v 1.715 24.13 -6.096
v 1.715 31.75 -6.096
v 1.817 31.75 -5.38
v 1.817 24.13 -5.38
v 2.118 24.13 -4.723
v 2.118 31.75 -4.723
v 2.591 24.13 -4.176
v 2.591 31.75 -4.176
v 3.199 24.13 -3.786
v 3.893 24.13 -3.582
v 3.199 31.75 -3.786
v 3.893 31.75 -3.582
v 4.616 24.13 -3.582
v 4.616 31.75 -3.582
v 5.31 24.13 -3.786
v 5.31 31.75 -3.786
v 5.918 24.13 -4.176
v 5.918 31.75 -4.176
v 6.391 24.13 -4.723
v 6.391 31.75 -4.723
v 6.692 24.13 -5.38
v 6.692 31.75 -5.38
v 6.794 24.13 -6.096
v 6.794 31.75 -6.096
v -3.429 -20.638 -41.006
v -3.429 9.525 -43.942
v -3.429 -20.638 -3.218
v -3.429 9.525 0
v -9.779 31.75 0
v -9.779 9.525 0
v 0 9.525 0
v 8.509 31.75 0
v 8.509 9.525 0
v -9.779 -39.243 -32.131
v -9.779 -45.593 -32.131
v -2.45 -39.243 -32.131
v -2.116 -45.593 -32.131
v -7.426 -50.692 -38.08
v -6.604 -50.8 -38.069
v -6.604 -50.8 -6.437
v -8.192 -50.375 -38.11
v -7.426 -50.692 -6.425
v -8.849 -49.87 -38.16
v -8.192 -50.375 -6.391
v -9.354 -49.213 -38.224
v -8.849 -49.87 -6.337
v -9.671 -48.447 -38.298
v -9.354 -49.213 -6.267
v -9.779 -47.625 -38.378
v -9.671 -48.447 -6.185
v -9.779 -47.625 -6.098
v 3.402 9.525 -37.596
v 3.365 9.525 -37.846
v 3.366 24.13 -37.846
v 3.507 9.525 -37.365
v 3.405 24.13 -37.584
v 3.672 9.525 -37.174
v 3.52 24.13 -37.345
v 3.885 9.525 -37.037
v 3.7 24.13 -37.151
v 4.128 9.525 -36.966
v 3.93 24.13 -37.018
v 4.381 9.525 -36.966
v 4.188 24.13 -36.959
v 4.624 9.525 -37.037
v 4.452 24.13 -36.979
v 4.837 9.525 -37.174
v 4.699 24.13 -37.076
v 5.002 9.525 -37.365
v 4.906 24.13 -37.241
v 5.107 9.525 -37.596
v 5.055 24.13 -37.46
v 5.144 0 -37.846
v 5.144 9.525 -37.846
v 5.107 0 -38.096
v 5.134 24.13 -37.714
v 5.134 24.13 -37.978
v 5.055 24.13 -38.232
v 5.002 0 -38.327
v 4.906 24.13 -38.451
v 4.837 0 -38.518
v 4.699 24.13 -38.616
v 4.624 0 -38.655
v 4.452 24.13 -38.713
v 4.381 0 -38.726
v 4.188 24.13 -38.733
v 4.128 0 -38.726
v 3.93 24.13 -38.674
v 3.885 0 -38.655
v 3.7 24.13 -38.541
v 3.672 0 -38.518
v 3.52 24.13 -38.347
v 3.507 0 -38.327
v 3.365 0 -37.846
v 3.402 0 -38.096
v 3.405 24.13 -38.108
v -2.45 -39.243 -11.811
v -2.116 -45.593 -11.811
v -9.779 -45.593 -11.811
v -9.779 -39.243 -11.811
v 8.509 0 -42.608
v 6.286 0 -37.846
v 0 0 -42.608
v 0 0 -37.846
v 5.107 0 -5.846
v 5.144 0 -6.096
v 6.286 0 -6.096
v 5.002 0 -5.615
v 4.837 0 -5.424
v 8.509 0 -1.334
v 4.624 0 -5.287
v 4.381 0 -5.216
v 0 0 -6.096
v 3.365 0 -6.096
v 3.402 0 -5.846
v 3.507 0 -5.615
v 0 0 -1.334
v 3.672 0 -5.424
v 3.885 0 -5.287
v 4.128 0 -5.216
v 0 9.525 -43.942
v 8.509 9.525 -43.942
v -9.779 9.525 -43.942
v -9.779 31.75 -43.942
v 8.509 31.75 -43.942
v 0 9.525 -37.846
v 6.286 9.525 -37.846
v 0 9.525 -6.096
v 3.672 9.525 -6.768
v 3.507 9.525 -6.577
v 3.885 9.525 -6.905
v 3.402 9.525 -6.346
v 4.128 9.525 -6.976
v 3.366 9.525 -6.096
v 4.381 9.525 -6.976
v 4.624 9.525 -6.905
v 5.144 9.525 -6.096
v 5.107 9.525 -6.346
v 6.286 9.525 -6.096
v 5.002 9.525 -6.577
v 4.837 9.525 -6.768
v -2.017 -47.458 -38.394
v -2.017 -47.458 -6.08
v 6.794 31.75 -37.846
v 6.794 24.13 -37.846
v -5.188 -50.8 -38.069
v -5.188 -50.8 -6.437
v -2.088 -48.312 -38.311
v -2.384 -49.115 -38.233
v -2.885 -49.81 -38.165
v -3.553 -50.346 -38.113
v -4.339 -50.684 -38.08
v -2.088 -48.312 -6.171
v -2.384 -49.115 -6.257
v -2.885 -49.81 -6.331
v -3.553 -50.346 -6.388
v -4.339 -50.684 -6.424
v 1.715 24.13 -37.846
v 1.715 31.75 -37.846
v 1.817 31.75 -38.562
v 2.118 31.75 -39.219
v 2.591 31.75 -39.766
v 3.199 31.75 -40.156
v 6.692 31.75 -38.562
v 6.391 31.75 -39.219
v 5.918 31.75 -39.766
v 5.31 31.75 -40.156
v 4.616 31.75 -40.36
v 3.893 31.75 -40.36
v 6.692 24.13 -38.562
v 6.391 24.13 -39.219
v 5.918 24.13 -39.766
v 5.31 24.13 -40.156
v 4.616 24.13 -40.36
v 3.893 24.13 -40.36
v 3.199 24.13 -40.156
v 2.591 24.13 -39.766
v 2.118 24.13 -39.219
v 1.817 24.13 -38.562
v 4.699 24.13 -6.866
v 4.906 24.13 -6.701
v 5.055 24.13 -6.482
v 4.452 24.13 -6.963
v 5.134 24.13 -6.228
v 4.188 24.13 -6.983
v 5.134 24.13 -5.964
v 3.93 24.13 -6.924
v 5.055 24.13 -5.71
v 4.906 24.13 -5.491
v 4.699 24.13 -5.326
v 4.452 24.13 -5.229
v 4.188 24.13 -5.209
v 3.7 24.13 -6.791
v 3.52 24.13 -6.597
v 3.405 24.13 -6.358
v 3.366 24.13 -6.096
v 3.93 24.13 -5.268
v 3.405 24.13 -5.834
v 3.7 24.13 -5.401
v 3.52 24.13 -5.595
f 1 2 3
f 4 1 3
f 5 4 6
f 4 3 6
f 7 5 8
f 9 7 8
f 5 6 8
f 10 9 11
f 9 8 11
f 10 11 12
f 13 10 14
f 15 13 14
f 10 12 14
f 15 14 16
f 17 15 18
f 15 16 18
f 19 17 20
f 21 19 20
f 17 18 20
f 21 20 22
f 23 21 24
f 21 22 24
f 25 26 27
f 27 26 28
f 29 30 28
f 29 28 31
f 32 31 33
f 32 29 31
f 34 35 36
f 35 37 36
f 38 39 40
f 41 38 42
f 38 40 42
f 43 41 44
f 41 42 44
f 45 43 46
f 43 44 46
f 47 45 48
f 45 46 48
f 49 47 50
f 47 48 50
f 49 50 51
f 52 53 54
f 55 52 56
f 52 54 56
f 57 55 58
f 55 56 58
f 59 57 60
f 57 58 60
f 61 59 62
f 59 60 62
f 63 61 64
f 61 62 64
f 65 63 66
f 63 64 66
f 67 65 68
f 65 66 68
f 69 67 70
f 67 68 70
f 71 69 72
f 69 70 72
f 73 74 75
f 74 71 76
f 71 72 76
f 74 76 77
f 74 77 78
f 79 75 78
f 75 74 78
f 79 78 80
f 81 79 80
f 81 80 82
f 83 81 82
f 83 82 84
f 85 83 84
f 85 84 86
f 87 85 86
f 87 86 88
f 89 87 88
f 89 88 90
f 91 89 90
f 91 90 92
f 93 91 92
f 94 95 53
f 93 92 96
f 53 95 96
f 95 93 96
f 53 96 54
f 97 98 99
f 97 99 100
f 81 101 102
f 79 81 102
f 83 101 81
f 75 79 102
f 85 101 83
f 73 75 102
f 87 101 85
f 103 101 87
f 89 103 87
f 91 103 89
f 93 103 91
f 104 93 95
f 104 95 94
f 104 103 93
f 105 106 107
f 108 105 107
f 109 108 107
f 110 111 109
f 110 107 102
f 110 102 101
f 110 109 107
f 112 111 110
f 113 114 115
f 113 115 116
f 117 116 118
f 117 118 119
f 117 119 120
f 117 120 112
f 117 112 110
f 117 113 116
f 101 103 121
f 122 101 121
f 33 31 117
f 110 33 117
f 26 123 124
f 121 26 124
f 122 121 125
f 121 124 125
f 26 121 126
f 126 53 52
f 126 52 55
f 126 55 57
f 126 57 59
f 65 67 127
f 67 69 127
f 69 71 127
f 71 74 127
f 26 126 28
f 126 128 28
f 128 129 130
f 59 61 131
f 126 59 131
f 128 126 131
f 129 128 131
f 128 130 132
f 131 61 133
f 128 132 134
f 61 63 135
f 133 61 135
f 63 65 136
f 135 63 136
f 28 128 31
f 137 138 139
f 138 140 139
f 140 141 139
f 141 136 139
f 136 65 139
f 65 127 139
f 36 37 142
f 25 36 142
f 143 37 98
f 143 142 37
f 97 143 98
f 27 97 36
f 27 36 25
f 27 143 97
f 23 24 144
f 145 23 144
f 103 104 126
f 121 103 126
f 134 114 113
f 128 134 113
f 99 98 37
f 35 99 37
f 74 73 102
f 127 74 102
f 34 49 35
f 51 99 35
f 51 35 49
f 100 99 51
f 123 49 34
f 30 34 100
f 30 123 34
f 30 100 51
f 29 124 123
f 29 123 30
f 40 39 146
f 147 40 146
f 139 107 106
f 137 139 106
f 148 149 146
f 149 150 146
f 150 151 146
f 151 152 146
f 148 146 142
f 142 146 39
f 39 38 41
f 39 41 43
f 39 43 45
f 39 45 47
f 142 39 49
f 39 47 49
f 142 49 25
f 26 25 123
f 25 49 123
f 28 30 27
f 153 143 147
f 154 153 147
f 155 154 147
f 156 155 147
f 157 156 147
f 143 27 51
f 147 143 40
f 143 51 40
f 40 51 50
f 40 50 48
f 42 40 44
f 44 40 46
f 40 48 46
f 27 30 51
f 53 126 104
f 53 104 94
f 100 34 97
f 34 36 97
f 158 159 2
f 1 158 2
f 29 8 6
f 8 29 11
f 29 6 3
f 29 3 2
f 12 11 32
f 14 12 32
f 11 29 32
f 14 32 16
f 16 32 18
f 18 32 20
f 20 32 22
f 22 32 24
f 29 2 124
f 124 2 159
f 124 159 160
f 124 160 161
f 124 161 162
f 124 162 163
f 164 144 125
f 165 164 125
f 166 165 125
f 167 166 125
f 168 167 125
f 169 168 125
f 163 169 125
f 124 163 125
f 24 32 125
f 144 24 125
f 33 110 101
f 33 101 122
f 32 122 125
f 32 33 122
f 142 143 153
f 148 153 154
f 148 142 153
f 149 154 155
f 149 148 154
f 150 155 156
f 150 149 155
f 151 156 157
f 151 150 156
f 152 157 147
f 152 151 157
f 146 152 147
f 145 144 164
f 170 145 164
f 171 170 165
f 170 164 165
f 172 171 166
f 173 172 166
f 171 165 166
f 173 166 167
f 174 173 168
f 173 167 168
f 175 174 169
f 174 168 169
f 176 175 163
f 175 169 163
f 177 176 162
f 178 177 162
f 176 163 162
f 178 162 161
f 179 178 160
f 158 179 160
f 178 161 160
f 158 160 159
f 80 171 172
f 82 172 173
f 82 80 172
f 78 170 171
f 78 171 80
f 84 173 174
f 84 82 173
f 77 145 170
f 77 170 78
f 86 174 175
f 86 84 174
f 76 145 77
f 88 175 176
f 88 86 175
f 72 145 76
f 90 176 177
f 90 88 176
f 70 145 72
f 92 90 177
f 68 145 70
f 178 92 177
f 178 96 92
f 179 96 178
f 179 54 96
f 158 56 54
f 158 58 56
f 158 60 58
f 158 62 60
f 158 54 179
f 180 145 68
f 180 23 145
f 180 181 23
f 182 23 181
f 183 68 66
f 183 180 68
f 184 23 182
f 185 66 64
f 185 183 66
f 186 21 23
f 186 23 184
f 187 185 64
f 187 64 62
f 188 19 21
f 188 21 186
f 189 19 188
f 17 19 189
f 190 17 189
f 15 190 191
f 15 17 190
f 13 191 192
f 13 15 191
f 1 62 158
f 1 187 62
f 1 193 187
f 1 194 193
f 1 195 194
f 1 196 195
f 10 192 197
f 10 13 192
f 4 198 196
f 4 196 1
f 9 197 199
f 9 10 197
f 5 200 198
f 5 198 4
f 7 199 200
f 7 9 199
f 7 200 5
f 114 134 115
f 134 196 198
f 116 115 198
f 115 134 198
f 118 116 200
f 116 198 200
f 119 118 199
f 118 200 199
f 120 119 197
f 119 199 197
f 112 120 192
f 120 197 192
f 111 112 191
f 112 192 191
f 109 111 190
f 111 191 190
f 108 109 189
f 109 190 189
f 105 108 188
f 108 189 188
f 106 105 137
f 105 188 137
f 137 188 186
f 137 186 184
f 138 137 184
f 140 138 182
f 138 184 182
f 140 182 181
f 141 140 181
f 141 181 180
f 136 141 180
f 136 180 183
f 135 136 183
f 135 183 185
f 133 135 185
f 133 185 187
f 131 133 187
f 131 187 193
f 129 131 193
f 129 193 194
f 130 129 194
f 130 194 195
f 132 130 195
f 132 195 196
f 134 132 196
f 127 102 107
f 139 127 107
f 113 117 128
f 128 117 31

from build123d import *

# Parameters (mm, degrees)
F0_W      = 31.75
F0_H      = 43.942
F1_DEPTH  = 8.509
F3_DEPTH  = 25.4
F4_R      = 0.889
F5_DEPTH  = 31.75
F7_DEPTH  = 9.525
F9_DEPTH  = 3.429
F10_DEPTH = 6.35
F11_W     = 6.35
F11_H     = 43.942
F12_DEPTH = 60.325
F13_W     = 6.35
F13_H     = 10.16
F14_DEPTH = 6.35
F16_DEPTH = 43.942
F17_DEPTH = 25.4
F19_DEPTH = 9.525
F20_R     = 3.175
F21_R     = 3.175
F22_R     = 0.889
F23_DEPTH = 7.62


with BuildPart() as f1:
    # F0 (on Right) → F1 (new body)
    with BuildSketch(Plane.YZ):
        with Locations((15.875, -21.971)):
            Rectangle(F0_W, F0_H)
    extrude(amount=F1_DEPTH)

    # F2 (on face) → F3 (cut)
    with BuildSketch(Plane(origin=(0, 0, 0), x_dir=(0, -1, 0), z_dir=(-1, 0, 0))):
        Polygon((0, 0), (-9.525, 0), (0, -1.3335), align=None)
        Polygon((0, -43.942), (0, -42.6085), (-9.525, -43.942), align=None)
    extrude(amount=-F3_DEPTH, mode=Mode.SUBTRACT)

    # F4 (on face) → F5 (cut)
    with BuildSketch(Plane(origin=(0, 31.75, 0), x_dir=(-1, 0, 0), z_dir=(0, 1, 0))):
        with Locations((-4.2545, -37.846)):
            Circle(F4_R)
        with Locations((-4.2545, -6.096)):
            Circle(F4_R)
    extrude(amount=-F5_DEPTH, mode=Mode.SUBTRACT)

    # F6 (on face) → F7 (cut)
    with BuildSketch(Plane.XZ):
        with BuildLine():
            Line((0, -37.846), (3.3655, -37.846))
            ThreePointArc((3.3655, -37.846), (4.2545, -36.957), (5.1435, -37.846))
            Line((5.1435, -37.846), (6.2865, -37.846))
            Line((6.2865, -37.846), (6.2865, -21.971))
            Line((6.2865, -21.971), (6.2865, -6.096))
            Line((6.2865, -6.096), (5.1435, -6.096))
            ThreePointArc((5.1435, -6.096), (4.2545, -6.985), (3.3655, -6.096))
            Line((3.3655, -6.096), (0, -6.096))
            Line((0, -6.096), (0, -37.846))
        make_face()
    extrude(amount=-F7_DEPTH, mode=Mode.SUBTRACT)

    # F8 (on face) → F9 (join)
    with BuildSketch(Plane(origin=(0, 0, 0), x_dir=(0, -1, 0), z_dir=(-1, 0, 0))):
        Polygon((-9.525, -37.846), (-9.525, -6.096), (-9.525, 0), (-31.75, 0), (-31.75, -43.942), (-9.525, -43.942), align=None)
    extrude(amount=F9_DEPTH)

    # F10 (add): a face of the model
    f10_faces = [f1.faces().sort_by_distance(p)[0] for p in [
        (-3.429, 20.6375, -21.971),
    ]]
    extrude(f10_faces, amount=F10_DEPTH)

    # F11 (on face) → F12 (join)
    with BuildSketch(Plane.XZ.offset(-9.525)):
        with Locations((-6.604, -21.971)):
            Rectangle(F11_W, F11_H)
    extrude(amount=F12_DEPTH)

    # F13 (on face) → F14 (cut)
    with BuildSketch(Plane.YZ.offset(-3.429)):
        with Locations((-42.418, -27.051)):
            Rectangle(F13_W, F13_H)
        with Locations((-42.418, -16.891)):
            Rectangle(F13_W, F13_H)
    extrude(amount=-F14_DEPTH, mode=Mode.SUBTRACT)

    # F15 (on face) → F16 (join, through all)
    with BuildSketch(Plane.XY):
        Polygon((-3.429, -20.6375), (-3.429, -50.8), (-1.8415, -50.8), align=None)
    extrude(amount=-F16_DEPTH)

    # F17 (cut): a face of the model
    f17_faces = [f1.faces().sort_by_distance(p)[0] for p in [
        (-3.429, -42.418, -21.971),
    ]]
    extrude(f17_faces, amount=-F17_DEPTH, mode=Mode.SUBTRACT)

    # F18 (on face) → F19 (cut)
    with BuildSketch(Plane(origin=(-9.779, 0, 0), x_dir=(0, -1, 0), z_dir=(-1, 0, 0))):
        Polygon((-9.525, 0), (50.8, -6.4365183935), (50.8, 0), align=None)
        Polygon((50.8, -43.942), (50.8, -38.0690358579), (-9.525, -43.942), align=None)
    extrude(amount=-F19_DEPTH, mode=Mode.SUBTRACT)

    # F20
    f20_edges = [f1.edges().sort_by_distance(p)[0] for p in [
        (-1.8415, -50.8, -22.252777),
    ]]
    fillet(f20_edges, radius=F20_R)

    # F21
    f21_edges = [f1.edges().sort_by_distance(p)[0] for p in [
        (-9.779, -50.8, -22.252777),
    ]]
    fillet(f21_edges, radius=F21_R)

    # F22 (on face) → F23 (cut)
    with BuildSketch(Plane(origin=(0, 31.75, 0), x_dir=(-1, 0, 0), z_dir=(0, 1, 0))):
        with BuildLine():
            ThreePointArc((-6.7945, -6.096), (-4.2545, -8.636), (-1.7145, -6.096))
            ThreePointArc((-1.7145, -6.096), (-4.2545, -3.556), (-6.7945, -6.096))
        make_face()
        with Locations((-4.2545, -6.096)):
            Circle(F22_R, mode=Mode.SUBTRACT)
        with BuildLine():
            Line((-1.7145, -37.846), (-1.7145, -6.096))
            ThreePointArc((-1.7145, -6.096), (-4.2545, -8.636), (-6.7945, -6.096))
            Line((-6.7945, -6.096), (-6.7945, -37.846))
            ThreePointArc((-6.7945, -37.846), (-4.2545, -35.306), (-1.7145, -37.846))
        make_face()
        with BuildLine():
            ThreePointArc((-6.7945, -37.846), (-4.2545, -40.386), (-1.7145, -37.846))
            ThreePointArc((-1.7145, -37.846), (-4.2545, -35.306), (-6.7945, -37.846))
        make_face()
        with Locations((-4.2545, -37.846)):
            Circle(F22_R, mode=Mode.SUBTRACT)
    extrude(amount=-F23_DEPTH, mode=Mode.SUBTRACT)


solid = f1.part
